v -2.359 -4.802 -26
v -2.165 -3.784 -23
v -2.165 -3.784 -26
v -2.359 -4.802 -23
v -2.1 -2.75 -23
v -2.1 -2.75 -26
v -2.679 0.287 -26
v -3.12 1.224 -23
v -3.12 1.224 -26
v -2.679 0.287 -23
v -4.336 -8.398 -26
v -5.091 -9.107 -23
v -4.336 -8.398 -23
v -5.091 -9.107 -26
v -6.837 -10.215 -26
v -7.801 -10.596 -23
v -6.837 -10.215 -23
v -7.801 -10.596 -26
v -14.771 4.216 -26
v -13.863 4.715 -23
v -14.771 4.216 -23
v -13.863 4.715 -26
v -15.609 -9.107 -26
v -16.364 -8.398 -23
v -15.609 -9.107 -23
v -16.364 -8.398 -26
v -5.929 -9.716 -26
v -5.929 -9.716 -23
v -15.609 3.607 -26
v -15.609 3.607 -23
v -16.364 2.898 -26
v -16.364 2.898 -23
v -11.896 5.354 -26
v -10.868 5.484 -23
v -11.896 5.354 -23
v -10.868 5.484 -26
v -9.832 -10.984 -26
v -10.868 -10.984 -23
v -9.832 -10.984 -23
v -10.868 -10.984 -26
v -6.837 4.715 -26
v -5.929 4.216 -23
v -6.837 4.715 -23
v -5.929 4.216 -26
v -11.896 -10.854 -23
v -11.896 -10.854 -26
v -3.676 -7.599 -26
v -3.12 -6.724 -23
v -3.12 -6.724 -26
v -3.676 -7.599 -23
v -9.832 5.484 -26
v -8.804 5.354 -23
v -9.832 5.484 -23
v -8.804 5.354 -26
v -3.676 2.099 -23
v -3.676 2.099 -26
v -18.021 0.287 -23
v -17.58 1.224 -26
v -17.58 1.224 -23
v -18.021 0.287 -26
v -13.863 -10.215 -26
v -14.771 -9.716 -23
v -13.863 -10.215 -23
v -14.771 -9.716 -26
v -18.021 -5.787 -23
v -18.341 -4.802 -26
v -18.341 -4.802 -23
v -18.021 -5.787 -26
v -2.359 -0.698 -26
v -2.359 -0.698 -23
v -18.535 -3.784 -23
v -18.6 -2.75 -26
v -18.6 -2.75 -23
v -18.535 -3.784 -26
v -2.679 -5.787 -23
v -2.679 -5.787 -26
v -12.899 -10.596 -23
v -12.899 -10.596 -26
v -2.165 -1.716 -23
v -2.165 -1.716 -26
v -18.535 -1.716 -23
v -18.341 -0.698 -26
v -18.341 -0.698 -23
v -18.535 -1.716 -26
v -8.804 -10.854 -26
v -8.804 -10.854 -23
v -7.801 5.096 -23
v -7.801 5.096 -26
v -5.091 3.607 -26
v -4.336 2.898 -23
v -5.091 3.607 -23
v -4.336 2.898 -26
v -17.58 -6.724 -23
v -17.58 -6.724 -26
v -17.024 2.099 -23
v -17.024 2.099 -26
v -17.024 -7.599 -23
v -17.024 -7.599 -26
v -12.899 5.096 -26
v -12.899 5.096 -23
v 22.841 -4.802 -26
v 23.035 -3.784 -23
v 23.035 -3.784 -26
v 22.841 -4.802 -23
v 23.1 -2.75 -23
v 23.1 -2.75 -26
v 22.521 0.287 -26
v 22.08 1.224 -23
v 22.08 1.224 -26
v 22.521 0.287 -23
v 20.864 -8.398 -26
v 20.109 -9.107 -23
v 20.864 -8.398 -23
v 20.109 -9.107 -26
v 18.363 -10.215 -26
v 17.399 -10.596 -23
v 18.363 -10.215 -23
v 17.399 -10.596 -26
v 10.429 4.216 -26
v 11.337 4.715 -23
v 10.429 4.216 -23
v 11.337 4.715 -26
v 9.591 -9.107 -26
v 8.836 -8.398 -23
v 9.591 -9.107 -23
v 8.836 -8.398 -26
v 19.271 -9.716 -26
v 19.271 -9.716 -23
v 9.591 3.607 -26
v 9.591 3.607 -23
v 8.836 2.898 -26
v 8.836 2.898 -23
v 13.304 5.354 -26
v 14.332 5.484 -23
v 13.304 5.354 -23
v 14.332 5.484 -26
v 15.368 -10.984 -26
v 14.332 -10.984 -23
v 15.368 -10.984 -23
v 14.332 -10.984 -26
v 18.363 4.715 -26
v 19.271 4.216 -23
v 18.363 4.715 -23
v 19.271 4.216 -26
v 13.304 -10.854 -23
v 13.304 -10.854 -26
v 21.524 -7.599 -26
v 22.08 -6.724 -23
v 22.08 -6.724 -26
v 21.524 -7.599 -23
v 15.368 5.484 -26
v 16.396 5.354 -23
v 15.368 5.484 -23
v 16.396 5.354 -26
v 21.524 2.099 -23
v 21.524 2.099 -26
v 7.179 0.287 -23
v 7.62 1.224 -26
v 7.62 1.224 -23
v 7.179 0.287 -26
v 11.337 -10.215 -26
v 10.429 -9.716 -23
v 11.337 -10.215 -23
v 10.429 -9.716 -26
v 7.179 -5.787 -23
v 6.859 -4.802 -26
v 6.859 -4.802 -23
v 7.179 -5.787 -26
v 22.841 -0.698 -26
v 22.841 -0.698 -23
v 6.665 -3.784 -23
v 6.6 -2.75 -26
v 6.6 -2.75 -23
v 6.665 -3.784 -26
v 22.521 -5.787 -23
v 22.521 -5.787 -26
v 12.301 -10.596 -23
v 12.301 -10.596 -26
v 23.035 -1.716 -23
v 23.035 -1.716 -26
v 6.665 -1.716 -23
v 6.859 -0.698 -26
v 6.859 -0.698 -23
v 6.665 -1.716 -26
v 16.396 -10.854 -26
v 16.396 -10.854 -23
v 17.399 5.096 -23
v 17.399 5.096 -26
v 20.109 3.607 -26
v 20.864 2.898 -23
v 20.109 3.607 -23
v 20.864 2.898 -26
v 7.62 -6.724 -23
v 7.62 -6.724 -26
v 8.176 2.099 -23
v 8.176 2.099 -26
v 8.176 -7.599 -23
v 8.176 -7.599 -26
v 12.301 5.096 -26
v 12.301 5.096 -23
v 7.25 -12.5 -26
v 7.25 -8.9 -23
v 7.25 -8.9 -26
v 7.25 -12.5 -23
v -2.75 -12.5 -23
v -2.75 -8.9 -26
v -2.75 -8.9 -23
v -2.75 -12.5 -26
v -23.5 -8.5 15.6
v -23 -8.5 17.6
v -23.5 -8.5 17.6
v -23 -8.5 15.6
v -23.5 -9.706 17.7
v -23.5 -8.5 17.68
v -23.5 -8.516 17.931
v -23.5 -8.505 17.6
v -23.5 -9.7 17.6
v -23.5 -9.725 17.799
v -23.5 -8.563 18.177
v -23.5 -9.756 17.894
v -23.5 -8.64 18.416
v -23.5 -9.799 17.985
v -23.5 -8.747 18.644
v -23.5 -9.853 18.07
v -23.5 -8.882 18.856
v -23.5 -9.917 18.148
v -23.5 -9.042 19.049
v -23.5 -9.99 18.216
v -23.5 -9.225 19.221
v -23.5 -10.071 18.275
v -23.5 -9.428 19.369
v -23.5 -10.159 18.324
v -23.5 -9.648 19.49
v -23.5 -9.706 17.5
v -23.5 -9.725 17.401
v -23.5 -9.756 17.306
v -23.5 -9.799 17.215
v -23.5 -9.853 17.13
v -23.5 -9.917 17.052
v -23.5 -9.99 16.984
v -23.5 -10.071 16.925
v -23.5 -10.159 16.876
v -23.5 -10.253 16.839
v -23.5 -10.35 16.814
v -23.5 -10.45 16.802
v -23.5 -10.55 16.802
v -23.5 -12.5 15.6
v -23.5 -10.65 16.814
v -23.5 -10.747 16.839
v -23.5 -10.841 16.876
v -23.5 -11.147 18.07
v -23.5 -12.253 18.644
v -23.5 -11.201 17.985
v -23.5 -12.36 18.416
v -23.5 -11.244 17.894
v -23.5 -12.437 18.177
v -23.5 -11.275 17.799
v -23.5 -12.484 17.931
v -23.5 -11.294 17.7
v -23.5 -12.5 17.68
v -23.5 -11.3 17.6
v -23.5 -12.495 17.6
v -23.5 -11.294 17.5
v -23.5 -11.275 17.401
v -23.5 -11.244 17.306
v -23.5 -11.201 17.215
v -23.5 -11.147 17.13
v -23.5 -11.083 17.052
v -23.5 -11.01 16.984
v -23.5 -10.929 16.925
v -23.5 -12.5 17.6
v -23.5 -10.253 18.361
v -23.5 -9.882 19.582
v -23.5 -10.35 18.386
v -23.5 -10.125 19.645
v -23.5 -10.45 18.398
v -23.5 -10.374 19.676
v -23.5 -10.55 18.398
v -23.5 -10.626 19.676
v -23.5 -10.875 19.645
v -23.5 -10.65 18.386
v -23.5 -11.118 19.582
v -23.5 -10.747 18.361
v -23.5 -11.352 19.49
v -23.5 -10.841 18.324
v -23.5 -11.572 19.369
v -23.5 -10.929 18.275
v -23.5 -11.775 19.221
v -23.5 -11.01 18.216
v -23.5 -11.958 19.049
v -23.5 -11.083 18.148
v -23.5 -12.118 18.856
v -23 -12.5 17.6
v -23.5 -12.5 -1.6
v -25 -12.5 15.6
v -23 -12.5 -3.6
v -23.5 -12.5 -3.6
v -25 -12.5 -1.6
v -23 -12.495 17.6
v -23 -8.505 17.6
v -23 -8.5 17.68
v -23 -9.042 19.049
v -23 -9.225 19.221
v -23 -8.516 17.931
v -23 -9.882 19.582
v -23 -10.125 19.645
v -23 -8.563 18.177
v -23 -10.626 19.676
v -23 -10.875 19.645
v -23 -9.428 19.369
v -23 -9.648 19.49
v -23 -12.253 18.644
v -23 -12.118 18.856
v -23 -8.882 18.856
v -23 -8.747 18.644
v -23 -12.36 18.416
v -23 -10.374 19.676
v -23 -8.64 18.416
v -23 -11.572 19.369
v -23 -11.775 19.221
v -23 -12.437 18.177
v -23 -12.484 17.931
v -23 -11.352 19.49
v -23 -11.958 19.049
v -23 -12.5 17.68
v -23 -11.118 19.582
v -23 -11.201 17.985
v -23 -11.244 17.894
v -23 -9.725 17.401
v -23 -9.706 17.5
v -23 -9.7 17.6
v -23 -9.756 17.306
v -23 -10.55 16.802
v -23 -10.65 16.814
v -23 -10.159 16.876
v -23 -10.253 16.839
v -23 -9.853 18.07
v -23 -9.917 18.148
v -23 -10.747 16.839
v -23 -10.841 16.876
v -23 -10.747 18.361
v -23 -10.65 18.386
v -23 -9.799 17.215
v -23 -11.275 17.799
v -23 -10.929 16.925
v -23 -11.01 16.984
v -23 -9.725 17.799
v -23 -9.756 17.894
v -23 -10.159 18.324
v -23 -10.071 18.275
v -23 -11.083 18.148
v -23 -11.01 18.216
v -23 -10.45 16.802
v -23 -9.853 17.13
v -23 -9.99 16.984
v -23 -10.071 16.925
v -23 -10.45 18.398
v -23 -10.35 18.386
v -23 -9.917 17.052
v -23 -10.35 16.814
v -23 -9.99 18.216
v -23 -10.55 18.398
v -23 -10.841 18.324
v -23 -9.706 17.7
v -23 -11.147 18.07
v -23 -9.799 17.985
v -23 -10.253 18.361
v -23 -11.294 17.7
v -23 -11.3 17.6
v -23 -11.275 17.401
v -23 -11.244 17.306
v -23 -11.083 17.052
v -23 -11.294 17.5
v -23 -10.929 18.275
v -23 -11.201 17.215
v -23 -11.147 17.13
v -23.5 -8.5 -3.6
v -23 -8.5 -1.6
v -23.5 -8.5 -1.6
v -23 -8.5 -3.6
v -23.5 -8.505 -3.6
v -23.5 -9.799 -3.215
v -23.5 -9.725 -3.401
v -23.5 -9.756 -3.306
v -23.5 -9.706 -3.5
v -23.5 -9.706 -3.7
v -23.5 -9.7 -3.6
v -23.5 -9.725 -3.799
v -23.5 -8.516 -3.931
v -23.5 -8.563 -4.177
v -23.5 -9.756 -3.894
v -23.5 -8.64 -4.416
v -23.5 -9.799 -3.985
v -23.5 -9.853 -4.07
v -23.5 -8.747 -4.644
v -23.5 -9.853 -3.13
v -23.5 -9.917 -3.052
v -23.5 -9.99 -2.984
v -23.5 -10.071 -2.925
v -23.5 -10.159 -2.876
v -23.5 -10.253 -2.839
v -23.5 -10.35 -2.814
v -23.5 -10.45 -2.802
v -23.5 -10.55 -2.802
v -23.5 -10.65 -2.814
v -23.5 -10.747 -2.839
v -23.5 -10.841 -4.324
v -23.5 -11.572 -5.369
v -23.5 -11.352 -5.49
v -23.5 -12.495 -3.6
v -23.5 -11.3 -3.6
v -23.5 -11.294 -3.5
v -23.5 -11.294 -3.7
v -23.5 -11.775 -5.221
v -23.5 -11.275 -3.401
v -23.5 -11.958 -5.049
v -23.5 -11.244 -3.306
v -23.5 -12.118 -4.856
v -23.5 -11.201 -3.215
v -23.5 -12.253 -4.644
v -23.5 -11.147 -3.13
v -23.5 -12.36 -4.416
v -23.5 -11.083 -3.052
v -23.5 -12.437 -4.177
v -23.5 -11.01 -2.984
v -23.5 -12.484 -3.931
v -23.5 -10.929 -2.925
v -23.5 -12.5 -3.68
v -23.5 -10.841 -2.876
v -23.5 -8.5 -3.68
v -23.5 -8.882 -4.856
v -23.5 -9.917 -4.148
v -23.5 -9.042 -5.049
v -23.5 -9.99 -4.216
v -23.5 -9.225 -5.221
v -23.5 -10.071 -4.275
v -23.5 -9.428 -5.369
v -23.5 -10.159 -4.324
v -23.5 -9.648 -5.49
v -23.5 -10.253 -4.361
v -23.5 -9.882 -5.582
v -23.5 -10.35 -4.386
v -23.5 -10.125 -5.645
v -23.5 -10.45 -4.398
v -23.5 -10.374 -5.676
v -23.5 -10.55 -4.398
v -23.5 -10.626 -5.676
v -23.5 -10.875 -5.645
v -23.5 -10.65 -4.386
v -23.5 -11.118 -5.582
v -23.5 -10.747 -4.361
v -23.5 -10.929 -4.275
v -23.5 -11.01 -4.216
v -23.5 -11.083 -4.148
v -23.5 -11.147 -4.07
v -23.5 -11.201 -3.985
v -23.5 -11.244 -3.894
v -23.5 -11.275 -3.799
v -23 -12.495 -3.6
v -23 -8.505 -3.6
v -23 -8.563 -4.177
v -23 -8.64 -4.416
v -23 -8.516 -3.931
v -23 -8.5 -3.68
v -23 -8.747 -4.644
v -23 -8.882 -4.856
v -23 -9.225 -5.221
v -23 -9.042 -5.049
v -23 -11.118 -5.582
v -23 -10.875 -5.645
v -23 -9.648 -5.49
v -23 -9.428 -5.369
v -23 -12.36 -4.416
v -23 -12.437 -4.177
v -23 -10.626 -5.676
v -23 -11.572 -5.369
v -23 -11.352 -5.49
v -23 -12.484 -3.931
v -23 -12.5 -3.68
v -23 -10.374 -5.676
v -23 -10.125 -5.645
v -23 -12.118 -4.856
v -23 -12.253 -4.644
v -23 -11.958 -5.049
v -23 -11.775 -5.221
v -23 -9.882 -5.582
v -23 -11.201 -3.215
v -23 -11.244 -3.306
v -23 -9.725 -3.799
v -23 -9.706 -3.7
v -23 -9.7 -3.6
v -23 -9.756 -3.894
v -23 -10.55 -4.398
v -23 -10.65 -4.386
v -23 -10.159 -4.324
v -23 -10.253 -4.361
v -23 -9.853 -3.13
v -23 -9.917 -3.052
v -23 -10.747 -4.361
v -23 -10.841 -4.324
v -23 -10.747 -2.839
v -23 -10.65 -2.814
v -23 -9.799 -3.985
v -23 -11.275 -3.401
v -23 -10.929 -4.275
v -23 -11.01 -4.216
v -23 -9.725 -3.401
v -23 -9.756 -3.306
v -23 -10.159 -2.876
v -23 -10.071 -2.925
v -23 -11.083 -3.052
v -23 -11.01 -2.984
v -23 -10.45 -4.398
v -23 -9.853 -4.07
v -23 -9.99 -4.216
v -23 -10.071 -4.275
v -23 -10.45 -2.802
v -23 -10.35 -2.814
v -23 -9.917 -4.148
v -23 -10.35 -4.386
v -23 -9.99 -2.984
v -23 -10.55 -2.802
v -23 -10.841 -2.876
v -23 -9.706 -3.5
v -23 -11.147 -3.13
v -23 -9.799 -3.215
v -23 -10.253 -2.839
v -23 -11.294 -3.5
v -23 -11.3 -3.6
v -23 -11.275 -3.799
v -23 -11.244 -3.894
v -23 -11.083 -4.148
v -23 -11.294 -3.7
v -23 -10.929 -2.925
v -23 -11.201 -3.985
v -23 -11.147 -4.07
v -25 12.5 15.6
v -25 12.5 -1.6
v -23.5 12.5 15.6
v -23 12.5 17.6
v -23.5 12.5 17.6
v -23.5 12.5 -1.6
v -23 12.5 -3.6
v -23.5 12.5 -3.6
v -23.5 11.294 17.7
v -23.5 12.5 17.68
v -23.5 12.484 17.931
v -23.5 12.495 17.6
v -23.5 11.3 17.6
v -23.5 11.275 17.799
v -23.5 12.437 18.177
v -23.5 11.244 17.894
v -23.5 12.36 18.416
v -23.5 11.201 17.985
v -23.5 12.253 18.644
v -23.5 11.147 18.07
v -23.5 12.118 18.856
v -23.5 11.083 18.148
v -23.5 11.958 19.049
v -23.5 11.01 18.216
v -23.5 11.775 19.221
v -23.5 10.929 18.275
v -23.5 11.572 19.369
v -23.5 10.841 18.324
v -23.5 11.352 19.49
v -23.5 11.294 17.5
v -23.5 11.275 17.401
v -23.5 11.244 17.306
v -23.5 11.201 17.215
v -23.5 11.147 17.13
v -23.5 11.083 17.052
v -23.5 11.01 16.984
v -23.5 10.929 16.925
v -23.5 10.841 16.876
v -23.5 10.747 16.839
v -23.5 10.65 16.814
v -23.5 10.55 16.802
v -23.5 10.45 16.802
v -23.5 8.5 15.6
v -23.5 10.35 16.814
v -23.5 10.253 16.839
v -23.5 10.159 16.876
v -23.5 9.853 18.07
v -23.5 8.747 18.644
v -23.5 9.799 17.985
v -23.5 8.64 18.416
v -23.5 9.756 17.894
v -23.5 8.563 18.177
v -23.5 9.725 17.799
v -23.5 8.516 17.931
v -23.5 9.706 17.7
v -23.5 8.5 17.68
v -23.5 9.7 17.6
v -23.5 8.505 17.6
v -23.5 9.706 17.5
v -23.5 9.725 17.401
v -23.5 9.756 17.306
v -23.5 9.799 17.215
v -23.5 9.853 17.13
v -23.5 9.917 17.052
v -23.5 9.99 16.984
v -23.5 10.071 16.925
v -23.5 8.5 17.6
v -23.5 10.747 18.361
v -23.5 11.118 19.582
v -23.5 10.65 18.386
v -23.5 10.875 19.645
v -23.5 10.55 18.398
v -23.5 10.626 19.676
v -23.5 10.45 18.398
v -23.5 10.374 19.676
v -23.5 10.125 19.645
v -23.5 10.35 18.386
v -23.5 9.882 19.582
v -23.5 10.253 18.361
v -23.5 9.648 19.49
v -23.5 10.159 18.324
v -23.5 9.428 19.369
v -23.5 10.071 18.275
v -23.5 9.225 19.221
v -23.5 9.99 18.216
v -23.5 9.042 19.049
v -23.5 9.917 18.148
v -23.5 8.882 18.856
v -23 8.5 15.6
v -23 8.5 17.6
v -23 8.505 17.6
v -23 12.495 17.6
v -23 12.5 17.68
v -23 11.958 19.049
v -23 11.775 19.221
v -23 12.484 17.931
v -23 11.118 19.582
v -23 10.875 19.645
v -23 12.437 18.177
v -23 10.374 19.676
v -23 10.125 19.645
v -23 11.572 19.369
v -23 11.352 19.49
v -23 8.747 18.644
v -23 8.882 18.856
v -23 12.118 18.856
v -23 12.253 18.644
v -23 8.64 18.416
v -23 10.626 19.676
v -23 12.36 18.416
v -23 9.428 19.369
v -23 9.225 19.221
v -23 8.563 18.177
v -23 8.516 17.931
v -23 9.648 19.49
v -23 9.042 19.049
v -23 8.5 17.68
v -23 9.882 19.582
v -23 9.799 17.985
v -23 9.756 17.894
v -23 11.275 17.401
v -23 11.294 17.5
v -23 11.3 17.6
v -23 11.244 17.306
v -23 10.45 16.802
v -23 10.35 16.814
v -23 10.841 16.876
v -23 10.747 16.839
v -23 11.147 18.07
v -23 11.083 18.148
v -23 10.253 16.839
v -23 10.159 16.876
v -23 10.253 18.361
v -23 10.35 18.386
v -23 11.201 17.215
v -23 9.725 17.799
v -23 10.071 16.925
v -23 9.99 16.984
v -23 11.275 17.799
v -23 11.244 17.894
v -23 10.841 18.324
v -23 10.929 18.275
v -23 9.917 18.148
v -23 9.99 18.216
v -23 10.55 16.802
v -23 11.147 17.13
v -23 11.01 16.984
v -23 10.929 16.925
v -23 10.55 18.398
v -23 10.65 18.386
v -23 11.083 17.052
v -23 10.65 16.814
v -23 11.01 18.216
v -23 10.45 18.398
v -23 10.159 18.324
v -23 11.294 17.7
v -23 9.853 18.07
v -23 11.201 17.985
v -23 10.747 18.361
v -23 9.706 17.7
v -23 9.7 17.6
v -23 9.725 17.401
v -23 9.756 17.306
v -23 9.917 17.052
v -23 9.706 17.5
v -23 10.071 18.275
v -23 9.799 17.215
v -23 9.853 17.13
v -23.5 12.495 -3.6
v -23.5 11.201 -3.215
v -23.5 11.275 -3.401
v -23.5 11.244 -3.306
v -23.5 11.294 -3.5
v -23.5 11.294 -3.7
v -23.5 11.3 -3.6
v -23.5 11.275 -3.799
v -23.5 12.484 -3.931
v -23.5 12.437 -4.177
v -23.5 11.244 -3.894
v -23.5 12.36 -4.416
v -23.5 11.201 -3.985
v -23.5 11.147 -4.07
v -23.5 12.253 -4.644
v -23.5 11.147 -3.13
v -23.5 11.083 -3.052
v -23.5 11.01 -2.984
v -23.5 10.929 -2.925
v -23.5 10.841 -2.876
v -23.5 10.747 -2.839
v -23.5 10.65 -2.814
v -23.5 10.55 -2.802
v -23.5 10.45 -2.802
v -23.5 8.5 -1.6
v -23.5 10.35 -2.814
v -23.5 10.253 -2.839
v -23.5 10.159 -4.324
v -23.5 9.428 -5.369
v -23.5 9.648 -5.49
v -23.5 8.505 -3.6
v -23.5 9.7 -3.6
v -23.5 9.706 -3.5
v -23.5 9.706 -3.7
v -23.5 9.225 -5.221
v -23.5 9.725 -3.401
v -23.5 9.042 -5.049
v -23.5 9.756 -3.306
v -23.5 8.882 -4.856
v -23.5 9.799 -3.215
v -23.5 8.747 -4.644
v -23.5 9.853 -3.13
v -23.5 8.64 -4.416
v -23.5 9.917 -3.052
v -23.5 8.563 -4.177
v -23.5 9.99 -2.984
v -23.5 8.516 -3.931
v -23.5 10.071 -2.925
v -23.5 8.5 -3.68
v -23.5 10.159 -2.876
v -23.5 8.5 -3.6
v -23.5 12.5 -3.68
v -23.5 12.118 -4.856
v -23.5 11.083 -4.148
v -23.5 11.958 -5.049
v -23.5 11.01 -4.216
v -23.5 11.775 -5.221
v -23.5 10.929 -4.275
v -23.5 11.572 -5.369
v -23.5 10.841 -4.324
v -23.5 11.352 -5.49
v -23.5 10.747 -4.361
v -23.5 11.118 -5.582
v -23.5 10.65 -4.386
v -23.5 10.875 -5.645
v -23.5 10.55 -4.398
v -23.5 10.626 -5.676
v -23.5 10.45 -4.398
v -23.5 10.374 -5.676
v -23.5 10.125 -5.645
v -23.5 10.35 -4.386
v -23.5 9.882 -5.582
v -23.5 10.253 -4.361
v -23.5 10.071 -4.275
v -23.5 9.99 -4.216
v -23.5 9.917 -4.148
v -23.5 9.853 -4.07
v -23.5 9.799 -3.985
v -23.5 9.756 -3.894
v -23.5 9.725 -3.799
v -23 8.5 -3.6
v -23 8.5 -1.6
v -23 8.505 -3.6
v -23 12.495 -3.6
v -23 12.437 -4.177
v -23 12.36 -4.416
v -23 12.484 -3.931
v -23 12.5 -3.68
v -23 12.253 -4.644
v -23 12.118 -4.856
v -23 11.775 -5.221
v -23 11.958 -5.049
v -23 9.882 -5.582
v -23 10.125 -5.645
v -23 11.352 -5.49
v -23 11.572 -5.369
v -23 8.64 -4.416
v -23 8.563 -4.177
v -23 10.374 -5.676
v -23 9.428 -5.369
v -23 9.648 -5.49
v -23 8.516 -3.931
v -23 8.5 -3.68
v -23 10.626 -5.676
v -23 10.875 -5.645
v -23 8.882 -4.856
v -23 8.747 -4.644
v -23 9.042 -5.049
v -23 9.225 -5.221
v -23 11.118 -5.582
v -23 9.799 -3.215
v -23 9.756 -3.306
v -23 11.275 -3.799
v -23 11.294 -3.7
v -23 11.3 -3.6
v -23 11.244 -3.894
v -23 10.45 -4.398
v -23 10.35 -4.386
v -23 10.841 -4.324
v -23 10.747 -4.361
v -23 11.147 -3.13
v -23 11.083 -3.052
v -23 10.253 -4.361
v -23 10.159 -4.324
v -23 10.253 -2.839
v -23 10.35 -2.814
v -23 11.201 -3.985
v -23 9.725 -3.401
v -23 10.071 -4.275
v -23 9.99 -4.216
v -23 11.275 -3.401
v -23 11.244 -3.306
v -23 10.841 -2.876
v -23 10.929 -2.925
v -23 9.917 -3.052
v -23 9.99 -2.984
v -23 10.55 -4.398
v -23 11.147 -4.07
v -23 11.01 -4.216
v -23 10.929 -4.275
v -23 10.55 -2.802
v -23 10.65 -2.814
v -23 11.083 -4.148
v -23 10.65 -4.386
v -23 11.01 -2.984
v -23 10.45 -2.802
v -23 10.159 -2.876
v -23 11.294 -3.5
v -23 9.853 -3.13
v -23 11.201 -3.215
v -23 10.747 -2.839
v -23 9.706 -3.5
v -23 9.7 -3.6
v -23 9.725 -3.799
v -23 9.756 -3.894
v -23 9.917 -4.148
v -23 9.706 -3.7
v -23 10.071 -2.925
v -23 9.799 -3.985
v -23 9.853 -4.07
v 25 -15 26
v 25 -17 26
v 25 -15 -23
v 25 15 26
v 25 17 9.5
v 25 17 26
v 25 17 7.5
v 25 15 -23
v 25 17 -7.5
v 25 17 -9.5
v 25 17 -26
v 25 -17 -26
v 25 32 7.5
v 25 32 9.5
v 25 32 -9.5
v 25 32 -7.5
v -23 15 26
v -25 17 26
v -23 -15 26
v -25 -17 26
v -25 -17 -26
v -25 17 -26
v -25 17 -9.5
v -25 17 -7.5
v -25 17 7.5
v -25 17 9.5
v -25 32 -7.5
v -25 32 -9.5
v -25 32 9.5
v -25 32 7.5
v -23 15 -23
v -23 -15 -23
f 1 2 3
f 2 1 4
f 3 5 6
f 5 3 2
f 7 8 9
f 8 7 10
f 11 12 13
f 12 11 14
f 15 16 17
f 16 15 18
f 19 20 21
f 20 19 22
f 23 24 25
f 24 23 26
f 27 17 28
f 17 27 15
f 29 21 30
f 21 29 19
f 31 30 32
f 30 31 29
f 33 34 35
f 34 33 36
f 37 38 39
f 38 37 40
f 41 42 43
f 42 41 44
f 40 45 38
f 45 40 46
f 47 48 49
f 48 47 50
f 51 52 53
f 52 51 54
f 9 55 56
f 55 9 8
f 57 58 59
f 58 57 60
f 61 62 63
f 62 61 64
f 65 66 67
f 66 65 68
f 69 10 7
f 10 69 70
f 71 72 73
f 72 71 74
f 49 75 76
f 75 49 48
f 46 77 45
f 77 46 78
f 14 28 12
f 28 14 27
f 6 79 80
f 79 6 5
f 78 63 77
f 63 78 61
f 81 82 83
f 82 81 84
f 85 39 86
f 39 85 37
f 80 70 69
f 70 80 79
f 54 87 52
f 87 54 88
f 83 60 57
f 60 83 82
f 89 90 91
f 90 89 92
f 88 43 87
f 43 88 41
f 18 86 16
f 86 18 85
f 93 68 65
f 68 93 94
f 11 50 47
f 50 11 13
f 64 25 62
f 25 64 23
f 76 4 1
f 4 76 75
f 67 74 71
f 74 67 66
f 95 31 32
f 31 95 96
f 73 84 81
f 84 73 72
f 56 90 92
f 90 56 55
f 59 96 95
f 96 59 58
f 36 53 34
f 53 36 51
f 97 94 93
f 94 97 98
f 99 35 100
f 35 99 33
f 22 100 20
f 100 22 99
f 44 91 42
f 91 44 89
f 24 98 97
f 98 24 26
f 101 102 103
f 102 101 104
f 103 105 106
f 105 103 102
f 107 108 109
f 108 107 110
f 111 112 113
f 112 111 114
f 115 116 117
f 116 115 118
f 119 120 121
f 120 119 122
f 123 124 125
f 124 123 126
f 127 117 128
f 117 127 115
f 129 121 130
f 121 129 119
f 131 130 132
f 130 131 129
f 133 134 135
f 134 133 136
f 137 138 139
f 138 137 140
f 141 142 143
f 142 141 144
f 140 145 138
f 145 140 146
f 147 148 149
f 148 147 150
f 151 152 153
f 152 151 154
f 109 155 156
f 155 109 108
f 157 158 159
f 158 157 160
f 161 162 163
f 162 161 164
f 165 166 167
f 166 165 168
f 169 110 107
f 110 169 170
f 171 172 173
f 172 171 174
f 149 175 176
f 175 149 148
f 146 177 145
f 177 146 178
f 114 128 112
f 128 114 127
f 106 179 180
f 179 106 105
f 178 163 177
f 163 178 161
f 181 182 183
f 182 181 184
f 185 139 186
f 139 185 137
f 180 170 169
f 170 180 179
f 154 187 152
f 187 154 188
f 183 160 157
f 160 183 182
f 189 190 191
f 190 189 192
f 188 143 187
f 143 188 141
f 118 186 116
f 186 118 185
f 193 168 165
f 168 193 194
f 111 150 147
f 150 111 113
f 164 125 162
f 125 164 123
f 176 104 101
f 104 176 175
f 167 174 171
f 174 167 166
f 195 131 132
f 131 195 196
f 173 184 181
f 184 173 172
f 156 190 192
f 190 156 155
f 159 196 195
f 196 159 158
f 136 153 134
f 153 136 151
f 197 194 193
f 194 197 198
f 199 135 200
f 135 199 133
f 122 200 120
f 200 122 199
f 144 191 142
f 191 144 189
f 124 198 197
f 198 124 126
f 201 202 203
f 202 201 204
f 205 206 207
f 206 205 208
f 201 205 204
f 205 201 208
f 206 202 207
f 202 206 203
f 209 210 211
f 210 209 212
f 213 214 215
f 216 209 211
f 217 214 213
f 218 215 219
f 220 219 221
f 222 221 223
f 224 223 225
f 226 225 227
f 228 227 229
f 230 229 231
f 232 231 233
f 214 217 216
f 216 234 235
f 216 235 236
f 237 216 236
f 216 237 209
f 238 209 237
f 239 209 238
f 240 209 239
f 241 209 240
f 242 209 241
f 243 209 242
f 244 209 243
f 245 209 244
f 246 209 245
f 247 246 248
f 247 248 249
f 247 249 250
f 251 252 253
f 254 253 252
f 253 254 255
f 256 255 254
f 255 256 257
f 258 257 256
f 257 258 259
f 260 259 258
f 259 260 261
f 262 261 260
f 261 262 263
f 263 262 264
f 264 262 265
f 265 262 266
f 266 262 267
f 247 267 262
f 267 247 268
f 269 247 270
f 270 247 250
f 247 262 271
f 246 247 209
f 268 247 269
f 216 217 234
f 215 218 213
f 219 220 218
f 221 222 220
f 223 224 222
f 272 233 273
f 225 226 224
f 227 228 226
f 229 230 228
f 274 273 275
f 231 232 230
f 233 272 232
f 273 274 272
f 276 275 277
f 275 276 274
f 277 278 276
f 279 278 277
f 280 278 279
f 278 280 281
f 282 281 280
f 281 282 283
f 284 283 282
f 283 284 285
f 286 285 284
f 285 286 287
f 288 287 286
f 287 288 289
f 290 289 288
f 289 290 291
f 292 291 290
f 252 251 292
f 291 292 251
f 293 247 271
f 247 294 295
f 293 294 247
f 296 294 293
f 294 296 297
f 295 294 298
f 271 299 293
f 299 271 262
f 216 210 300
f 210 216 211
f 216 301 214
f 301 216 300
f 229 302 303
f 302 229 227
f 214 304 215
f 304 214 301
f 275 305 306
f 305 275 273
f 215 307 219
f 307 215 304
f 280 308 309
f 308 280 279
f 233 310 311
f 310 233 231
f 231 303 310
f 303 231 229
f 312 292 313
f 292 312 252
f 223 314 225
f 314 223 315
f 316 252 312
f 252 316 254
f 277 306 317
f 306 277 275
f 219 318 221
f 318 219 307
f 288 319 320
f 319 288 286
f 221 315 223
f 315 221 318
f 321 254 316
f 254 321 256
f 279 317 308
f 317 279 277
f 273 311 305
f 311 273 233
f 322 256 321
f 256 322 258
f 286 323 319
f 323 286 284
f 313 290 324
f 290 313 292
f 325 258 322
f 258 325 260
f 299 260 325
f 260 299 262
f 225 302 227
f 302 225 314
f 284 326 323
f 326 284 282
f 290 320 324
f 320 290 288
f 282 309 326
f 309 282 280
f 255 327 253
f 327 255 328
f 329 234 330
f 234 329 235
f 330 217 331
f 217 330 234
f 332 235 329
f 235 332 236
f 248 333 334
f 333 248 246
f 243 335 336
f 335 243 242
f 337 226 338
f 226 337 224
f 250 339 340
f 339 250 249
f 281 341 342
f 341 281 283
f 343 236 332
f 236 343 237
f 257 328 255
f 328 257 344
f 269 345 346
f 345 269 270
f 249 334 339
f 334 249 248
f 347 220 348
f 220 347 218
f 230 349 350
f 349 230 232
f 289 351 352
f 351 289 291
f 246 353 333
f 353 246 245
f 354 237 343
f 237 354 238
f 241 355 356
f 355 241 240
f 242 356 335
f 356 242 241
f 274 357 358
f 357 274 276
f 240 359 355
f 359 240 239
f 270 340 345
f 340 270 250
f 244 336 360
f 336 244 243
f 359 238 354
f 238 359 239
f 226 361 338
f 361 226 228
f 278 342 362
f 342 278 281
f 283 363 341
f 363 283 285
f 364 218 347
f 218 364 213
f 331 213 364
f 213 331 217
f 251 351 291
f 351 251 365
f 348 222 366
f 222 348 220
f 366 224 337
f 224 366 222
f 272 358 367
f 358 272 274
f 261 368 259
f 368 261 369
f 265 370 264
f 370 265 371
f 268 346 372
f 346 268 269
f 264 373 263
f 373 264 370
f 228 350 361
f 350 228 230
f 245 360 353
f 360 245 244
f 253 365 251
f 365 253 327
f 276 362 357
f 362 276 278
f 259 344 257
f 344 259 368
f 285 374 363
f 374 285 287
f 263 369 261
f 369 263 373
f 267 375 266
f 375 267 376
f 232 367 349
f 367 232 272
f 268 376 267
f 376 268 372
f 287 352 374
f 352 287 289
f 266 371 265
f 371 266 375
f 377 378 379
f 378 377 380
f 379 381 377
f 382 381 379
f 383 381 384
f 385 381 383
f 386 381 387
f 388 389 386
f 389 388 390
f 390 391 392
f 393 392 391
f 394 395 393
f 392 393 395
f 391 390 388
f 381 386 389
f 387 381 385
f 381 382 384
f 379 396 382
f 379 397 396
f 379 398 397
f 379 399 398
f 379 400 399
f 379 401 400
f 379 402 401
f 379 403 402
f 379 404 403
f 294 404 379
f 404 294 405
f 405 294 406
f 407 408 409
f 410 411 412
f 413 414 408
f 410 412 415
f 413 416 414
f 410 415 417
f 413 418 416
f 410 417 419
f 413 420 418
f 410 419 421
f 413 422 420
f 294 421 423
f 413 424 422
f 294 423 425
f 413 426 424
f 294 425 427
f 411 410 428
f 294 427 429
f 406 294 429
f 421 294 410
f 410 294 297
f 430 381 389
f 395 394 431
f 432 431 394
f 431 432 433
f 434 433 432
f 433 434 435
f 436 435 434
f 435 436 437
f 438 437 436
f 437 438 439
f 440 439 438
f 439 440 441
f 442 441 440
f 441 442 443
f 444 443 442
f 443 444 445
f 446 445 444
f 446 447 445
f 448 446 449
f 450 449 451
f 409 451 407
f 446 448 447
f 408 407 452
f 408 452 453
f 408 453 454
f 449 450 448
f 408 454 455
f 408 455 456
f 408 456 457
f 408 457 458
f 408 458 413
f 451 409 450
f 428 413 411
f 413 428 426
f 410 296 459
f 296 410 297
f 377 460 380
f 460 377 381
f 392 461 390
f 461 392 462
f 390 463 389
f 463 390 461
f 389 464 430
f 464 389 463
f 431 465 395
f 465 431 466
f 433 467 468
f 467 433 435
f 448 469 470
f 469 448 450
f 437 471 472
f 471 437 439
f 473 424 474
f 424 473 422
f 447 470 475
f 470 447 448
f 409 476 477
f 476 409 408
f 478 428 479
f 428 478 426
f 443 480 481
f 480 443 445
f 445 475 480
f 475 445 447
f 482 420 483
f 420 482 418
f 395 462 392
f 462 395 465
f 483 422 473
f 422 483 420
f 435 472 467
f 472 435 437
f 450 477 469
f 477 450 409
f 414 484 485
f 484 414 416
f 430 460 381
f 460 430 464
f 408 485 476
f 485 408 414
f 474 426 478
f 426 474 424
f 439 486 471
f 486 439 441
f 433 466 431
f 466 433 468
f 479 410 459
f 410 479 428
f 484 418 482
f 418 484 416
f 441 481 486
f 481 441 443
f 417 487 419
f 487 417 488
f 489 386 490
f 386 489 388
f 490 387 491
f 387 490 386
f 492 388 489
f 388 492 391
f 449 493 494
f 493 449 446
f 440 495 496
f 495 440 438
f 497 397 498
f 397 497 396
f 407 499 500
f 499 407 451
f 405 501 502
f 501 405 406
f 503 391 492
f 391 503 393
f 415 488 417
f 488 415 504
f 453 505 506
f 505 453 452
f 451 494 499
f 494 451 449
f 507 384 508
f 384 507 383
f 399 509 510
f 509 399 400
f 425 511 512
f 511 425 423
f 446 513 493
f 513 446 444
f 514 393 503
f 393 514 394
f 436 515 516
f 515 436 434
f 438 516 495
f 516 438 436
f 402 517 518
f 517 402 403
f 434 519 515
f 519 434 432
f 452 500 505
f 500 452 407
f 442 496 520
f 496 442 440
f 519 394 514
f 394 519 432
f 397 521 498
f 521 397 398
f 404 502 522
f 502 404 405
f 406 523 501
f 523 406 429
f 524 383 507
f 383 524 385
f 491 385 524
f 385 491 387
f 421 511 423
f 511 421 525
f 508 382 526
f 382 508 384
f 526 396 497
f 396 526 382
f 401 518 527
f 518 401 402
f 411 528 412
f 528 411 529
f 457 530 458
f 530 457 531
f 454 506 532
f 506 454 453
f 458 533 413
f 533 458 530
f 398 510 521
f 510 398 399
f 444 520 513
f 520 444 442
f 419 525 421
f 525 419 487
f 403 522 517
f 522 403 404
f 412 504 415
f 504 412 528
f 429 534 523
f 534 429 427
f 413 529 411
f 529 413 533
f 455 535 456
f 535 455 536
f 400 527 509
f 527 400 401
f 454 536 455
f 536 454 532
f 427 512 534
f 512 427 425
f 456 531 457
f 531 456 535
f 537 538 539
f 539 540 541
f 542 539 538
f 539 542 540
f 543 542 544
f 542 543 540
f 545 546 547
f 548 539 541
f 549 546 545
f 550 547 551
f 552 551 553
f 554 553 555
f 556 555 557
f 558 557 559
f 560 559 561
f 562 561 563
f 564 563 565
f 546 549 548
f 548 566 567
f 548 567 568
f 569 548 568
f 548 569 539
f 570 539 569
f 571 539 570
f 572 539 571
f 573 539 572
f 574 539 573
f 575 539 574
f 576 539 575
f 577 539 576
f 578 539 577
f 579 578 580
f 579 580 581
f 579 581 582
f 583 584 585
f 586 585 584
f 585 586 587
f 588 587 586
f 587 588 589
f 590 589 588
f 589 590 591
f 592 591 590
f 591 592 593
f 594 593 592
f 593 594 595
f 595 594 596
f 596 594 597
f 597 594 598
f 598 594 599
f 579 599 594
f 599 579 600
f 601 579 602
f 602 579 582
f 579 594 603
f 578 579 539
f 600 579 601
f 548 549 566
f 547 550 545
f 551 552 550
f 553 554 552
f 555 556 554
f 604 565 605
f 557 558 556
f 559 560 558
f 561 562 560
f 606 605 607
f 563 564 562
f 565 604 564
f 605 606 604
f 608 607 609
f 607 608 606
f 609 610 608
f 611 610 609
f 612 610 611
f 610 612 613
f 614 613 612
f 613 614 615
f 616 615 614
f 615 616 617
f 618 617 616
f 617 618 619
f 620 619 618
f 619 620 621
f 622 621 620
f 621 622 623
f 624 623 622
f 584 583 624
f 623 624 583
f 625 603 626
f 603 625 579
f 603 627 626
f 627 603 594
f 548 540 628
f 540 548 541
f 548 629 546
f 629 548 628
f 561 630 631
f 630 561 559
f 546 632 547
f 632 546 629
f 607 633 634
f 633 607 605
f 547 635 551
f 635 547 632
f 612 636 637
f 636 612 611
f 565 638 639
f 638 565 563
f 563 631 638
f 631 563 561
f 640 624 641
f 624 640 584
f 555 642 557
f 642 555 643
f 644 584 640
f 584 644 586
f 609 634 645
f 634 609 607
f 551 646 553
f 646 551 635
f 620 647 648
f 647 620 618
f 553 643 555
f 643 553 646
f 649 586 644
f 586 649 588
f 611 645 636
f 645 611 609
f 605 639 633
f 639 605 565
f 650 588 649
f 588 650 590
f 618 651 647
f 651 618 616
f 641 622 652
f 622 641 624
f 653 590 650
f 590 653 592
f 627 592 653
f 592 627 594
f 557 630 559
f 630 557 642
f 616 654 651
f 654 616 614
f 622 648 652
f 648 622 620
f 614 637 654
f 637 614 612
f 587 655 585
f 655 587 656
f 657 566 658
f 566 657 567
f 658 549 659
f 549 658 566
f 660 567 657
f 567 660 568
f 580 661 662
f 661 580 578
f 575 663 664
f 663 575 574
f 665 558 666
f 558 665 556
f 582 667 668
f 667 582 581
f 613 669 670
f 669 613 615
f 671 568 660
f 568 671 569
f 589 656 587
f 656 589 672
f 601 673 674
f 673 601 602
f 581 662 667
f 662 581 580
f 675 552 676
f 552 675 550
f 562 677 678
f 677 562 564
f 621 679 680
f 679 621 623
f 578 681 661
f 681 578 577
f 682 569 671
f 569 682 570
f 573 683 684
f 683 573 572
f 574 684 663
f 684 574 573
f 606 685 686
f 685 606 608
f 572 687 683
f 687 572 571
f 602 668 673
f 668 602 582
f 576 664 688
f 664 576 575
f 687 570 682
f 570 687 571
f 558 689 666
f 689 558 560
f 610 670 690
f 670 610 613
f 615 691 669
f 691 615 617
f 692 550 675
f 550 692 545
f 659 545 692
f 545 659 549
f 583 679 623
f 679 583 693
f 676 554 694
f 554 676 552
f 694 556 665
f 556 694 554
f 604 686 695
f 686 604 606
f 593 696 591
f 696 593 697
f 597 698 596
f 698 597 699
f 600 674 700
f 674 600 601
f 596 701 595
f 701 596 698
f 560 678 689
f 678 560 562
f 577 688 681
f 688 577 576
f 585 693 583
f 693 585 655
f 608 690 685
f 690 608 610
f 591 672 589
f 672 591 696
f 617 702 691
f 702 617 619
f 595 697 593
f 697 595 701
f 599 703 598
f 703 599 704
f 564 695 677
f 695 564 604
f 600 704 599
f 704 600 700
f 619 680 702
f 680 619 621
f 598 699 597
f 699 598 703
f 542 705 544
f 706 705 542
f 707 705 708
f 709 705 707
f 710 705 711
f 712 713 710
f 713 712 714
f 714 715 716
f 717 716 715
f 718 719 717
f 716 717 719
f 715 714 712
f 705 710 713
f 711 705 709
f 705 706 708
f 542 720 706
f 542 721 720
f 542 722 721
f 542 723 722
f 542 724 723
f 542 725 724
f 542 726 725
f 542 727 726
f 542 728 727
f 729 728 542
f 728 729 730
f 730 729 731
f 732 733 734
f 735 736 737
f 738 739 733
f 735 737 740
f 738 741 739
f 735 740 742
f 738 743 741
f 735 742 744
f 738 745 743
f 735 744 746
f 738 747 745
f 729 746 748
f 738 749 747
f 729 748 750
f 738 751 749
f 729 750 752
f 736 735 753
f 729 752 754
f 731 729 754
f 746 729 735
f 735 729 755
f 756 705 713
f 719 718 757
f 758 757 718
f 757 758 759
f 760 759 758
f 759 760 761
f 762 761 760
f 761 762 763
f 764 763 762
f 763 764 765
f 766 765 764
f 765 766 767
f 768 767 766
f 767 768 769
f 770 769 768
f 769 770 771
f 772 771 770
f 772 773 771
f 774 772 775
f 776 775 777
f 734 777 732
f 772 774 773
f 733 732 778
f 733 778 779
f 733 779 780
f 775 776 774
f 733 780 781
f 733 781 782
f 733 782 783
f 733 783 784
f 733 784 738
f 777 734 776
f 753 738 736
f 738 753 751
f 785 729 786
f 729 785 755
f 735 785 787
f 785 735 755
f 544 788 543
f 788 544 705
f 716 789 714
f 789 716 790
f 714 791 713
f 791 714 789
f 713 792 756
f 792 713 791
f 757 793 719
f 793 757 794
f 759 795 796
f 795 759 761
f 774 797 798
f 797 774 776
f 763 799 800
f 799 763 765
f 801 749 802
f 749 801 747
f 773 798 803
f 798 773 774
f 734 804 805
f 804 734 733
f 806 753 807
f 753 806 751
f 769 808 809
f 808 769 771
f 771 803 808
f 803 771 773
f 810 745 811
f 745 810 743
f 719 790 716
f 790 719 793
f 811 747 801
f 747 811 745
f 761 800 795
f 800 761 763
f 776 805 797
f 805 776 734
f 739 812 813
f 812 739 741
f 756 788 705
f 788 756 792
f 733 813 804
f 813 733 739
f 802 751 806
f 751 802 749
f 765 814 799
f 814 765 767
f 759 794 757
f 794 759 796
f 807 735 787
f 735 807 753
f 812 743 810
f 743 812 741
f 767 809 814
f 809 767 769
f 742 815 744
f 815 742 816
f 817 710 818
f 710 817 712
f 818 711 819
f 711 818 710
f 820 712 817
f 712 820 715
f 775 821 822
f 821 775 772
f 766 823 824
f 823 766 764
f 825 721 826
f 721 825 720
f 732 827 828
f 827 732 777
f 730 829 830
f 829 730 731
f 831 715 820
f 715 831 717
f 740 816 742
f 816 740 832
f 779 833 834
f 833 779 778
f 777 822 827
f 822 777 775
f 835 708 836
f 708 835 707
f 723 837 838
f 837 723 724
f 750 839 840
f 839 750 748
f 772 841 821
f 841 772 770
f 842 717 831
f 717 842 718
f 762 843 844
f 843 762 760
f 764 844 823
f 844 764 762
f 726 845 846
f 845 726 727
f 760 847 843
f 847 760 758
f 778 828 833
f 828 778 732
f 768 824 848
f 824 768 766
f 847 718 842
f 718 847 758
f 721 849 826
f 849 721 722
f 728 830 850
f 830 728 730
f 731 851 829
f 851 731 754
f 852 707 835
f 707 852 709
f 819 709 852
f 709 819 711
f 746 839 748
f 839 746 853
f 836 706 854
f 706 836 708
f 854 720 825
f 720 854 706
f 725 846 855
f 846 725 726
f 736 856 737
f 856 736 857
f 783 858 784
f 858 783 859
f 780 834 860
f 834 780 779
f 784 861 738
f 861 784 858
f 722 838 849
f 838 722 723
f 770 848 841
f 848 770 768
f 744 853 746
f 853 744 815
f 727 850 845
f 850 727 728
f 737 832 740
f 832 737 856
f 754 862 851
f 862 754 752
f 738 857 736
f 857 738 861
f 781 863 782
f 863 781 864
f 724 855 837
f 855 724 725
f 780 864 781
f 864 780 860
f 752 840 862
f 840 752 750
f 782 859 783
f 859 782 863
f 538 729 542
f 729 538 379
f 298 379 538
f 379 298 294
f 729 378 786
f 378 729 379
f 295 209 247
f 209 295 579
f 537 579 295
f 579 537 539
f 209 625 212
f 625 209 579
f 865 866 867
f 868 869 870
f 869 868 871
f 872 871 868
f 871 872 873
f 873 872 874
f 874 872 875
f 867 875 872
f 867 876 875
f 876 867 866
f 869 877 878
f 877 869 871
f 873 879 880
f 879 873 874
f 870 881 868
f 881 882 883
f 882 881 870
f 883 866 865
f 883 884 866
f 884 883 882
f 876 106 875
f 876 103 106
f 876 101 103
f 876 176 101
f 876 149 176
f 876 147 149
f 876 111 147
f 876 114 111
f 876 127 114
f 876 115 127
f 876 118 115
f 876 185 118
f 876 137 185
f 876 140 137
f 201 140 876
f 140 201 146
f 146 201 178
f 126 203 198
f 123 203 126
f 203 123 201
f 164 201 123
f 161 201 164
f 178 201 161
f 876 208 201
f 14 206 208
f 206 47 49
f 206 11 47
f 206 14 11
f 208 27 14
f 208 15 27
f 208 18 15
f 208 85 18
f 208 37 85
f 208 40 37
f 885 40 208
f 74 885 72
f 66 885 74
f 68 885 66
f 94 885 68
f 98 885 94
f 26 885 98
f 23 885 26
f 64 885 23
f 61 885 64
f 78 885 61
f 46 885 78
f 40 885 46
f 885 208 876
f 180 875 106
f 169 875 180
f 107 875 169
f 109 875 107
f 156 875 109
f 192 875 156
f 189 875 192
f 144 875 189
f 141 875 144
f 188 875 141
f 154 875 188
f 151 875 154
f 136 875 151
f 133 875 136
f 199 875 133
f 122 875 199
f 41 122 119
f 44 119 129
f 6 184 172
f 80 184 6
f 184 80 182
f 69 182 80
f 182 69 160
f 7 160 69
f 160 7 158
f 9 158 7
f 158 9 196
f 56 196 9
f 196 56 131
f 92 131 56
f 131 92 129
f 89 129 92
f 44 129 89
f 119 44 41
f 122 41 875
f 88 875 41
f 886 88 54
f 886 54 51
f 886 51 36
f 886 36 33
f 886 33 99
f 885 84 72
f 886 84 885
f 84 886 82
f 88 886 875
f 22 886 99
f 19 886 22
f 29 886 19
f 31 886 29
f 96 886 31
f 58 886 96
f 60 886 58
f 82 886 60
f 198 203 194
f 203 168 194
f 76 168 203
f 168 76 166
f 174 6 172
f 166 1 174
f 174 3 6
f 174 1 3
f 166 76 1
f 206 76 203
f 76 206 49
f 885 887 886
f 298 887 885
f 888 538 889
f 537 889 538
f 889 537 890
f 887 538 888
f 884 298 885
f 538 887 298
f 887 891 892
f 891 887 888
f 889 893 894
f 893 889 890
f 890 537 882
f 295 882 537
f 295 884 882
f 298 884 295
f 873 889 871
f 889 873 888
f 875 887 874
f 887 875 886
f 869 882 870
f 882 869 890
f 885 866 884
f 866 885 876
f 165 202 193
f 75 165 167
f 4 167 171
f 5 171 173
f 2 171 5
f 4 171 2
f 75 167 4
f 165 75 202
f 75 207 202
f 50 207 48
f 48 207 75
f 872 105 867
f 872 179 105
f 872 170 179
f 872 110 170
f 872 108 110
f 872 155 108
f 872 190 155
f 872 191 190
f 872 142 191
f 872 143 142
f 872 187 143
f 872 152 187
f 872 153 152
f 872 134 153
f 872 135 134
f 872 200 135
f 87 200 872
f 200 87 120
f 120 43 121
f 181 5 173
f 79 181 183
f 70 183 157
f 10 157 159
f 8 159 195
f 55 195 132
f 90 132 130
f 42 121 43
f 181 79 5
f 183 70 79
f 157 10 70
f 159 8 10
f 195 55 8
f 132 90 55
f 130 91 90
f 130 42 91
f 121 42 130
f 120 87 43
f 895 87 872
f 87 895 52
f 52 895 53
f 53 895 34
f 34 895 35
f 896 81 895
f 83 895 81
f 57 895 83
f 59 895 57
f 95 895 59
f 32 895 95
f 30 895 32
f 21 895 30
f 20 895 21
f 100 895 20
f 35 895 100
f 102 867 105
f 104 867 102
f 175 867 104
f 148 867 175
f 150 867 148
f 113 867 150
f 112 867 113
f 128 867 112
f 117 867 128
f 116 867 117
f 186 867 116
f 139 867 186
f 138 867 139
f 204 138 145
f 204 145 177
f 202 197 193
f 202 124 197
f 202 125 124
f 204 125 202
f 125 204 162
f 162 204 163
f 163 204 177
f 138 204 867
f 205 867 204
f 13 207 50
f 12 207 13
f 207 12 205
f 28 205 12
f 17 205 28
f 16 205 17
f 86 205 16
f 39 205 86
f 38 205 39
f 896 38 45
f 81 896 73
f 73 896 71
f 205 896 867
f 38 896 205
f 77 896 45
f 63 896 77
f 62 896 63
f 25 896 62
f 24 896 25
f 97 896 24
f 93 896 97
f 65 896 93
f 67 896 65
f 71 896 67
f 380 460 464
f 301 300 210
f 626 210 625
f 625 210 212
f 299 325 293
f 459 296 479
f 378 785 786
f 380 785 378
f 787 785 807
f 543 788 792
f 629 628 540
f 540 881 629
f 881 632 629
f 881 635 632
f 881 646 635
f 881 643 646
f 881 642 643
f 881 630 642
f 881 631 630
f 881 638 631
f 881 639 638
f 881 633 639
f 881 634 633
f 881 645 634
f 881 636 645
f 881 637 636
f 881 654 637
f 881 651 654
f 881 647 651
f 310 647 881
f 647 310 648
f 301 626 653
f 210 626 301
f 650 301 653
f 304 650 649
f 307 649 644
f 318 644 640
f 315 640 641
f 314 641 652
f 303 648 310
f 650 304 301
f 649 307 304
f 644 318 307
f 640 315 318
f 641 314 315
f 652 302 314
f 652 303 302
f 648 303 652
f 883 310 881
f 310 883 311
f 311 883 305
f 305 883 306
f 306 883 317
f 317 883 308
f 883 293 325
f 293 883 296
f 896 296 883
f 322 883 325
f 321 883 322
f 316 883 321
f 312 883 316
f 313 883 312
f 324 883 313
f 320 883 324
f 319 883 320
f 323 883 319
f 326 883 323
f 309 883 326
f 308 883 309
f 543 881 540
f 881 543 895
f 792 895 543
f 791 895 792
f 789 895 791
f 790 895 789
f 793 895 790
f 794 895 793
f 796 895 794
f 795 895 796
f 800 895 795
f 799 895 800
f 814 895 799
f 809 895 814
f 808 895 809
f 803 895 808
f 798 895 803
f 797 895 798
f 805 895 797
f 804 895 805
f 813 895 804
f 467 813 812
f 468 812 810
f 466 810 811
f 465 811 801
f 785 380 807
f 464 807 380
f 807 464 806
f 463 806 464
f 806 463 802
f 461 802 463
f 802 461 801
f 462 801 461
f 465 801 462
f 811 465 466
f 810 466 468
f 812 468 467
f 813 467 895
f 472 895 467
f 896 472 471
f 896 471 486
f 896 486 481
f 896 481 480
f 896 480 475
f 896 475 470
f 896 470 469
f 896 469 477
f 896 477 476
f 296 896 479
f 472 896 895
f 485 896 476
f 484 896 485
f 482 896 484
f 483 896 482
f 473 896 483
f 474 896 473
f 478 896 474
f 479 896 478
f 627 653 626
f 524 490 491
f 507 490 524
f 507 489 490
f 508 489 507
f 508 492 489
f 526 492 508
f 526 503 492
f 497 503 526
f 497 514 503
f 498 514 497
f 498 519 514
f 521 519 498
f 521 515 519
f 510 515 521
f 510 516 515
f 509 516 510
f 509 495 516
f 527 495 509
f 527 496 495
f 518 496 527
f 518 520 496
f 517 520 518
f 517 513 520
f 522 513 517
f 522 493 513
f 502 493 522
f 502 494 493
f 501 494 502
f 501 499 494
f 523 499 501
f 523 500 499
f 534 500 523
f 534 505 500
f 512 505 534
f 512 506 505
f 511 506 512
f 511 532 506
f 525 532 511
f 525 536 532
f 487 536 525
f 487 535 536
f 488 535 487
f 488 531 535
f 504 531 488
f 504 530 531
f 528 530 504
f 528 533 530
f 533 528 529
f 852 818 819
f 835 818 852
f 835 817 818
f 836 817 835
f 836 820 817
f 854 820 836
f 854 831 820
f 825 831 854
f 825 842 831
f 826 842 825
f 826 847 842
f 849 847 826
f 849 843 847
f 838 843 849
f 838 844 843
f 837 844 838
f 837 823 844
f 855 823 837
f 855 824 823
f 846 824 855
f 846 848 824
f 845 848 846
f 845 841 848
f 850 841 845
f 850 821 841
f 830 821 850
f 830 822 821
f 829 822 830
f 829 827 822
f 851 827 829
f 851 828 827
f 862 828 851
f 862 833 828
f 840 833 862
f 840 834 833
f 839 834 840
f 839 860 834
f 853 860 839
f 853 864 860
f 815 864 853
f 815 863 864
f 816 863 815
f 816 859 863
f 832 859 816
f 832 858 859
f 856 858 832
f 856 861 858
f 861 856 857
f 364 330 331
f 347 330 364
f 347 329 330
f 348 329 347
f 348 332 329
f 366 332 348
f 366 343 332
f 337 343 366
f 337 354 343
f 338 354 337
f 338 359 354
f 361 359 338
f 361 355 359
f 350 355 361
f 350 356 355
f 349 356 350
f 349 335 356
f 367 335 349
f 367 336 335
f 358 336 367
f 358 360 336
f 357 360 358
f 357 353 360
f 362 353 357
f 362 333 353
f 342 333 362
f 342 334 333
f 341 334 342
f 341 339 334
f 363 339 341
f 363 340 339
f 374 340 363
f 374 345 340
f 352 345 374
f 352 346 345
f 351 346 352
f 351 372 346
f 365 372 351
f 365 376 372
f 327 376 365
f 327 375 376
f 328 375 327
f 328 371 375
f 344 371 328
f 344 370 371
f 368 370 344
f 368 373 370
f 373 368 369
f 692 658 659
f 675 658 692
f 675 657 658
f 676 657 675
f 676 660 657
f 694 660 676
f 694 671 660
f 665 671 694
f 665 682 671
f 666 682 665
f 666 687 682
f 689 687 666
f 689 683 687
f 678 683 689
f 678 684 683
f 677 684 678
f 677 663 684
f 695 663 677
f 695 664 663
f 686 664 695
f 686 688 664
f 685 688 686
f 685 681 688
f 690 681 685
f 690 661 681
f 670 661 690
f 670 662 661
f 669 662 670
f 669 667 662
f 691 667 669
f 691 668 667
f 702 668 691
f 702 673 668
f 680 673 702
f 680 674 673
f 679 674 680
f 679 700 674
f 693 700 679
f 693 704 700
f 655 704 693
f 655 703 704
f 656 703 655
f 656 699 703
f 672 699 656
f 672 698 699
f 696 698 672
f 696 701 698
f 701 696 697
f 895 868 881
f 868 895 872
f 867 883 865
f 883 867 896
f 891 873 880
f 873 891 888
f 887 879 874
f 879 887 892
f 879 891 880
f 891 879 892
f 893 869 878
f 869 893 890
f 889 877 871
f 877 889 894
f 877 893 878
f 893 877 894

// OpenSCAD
// Set smoothness of circles
$fn = 50;

// SSD1306 specific variables
ssd1306_base_length = 25.0;
ssd1306_base_width = 17.2;
ssd1306_base_height = 1;
ssd1306_display_length = 25.0;
ssd1306_display_width = 17.2;
ssd1306_display_height = 2.7;
ssd1306_mount_diameter = 4.0;
ssd1306_mount_interior_diameter = 1.6;

// HCSR05 specific variables

// Builds an SSD1306 display mockup to use as a cutout.
module ssd1306() {
  // Create the base layer
  cube([ssd1306_base_length, ssd1306_base_width, ssd1306_base_height], center = true);
  translate([0, 0, ssd1306_display_height / 2 + ssd1306_base_height / 2 ]) {
    cube([ssd1306_display_length, ssd1306_display_width, ssd1306_display_height], center = true);
  }
  // Create the 4 mount extrusions
  for (i = [-1, 1]){
    for (j = [-1, 1]) {
      translate([i * ssd1306_base_length/2 - (i * ssd1306_mount_diameter/2),
                 j * ssd1306_base_width/2 + (j * ssd1306_mount_diameter/2),
                 0]) {
        difference() {
          union() {
            translate([0, -(j * ssd1306_mount_diameter/2), 0]) {
              cube([ssd1306_mount_diameter, ssd1306_mount_diameter, ssd1306_base_height], center = true);
            }
            translate([0, (j * ssd1306_mount_diameter/$fn), 0]) {
              cylinder(ssd1306_base_height, d=ssd1306_mount_diameter, center = true);
            }
          }
          cylinder(ssd1306_base_height + 2, d=ssd1306_mount_interior_diameter, center = true);
        }
      }
    }
  }
}

// SSD1306 specific variables
hcsr05_base_length = 45.5;
hcsr05_base_width = 20.5;
hcsr05_base_height = 1.6;
hcsr05_extrusion_length = 10;
hcsr05_extrusion_width = 3.6;
hcsr05_extrusion_height = 5 - hcsr05_base_height;
hcsr05_echo_height = 14 - hcsr05_base_height;
hcsr05_echo_diameter = 16.5;

// Builds a very basic hcsr05 mockup to use as a cutout.
module hcsr05() {
  // Base plate
  cube([hcsr05_base_length, hcsr05_base_width, hcsr05_base_height], center = true);
  // Little mount on top
  translate([0,
             (hcsr05_base_width/2 - hcsr05_extrusion_width/2 - 0.5),
             hcsr05_base_height/2 + hcsr05_extrusion_height/2]) {
    cube([hcsr05_extrusion_length, hcsr05_extrusion_width, hcsr05_extrusion_height], center = true);
  }
  // Sensors
  for (i = [-1, 1]) {
    translate([i * hcsr05_base_length/2 - (i * hcsr05_echo_diameter/2) - (i * 1.9),
               0,
               hcsr05_base_height/2]) {
      cylinder(d = hcsr05_echo_diameter, h = hcsr05_echo_height);
    }
  }
}

// TODO: Maybe add a small standoff on top of the hcsr05 to keep the esp32 away.
module esp32_standoff() {

}

enclosure_wall_width = 2;
enclosure_table_size = 17;
enclosure_holding_width = 15;
enclosure_length = 46;
enclosure_width = 30;
enclosure_height = 50;

module enclosure() {
  difference() {
    cube([enclosure_length + enclosure_wall_width * 2,
          enclosure_width + enclosure_wall_width * 2,
          enclosure_height + enclosure_wall_width], center = true);
    translate([enclosure_wall_width, 0, enclosure_wall_width]) {
      cube([enclosure_length + 2 * enclosure_wall_width, enclosure_width, enclosure_height], center = true);
    }
    translate([(enclosure_length - hcsr05_base_length)/2 + enclosure_wall_width,
               - (enclosure_width - hcsr05_base_width)/2 + enclosure_wall_width,
               - (enclosure_height/2 - enclosure_wall_width - hcsr05_base_height/2 - 0.1)]) {
      rotate([180, 0, 0]) {
        hcsr05();
      }
    }
    translate([- enclosure_length/2,
               0,
               7]) {
      rotate([0, -90, 0]) {
        rotate([0, 0, 90]) {
          #ssd1306();
        }
      }
    }
  }
  translate([0,
             enclosure_width/2 + enclosure_holding_width/2 + enclosure_wall_width,
             - enclosure_table_size/2]) {
    cube([enclosure_length + enclosure_wall_width * 2, enclosure_holding_width, 2], center = true);
  }
  translate([0,
             enclosure_width/2 + enclosure_holding_width/2 + enclosure_wall_width, enclosure_table_size/2]) {
    cube([enclosure_length + enclosure_wall_width * 2, enclosure_holding_width, 2], center = true);
  }
}

enclosure();
